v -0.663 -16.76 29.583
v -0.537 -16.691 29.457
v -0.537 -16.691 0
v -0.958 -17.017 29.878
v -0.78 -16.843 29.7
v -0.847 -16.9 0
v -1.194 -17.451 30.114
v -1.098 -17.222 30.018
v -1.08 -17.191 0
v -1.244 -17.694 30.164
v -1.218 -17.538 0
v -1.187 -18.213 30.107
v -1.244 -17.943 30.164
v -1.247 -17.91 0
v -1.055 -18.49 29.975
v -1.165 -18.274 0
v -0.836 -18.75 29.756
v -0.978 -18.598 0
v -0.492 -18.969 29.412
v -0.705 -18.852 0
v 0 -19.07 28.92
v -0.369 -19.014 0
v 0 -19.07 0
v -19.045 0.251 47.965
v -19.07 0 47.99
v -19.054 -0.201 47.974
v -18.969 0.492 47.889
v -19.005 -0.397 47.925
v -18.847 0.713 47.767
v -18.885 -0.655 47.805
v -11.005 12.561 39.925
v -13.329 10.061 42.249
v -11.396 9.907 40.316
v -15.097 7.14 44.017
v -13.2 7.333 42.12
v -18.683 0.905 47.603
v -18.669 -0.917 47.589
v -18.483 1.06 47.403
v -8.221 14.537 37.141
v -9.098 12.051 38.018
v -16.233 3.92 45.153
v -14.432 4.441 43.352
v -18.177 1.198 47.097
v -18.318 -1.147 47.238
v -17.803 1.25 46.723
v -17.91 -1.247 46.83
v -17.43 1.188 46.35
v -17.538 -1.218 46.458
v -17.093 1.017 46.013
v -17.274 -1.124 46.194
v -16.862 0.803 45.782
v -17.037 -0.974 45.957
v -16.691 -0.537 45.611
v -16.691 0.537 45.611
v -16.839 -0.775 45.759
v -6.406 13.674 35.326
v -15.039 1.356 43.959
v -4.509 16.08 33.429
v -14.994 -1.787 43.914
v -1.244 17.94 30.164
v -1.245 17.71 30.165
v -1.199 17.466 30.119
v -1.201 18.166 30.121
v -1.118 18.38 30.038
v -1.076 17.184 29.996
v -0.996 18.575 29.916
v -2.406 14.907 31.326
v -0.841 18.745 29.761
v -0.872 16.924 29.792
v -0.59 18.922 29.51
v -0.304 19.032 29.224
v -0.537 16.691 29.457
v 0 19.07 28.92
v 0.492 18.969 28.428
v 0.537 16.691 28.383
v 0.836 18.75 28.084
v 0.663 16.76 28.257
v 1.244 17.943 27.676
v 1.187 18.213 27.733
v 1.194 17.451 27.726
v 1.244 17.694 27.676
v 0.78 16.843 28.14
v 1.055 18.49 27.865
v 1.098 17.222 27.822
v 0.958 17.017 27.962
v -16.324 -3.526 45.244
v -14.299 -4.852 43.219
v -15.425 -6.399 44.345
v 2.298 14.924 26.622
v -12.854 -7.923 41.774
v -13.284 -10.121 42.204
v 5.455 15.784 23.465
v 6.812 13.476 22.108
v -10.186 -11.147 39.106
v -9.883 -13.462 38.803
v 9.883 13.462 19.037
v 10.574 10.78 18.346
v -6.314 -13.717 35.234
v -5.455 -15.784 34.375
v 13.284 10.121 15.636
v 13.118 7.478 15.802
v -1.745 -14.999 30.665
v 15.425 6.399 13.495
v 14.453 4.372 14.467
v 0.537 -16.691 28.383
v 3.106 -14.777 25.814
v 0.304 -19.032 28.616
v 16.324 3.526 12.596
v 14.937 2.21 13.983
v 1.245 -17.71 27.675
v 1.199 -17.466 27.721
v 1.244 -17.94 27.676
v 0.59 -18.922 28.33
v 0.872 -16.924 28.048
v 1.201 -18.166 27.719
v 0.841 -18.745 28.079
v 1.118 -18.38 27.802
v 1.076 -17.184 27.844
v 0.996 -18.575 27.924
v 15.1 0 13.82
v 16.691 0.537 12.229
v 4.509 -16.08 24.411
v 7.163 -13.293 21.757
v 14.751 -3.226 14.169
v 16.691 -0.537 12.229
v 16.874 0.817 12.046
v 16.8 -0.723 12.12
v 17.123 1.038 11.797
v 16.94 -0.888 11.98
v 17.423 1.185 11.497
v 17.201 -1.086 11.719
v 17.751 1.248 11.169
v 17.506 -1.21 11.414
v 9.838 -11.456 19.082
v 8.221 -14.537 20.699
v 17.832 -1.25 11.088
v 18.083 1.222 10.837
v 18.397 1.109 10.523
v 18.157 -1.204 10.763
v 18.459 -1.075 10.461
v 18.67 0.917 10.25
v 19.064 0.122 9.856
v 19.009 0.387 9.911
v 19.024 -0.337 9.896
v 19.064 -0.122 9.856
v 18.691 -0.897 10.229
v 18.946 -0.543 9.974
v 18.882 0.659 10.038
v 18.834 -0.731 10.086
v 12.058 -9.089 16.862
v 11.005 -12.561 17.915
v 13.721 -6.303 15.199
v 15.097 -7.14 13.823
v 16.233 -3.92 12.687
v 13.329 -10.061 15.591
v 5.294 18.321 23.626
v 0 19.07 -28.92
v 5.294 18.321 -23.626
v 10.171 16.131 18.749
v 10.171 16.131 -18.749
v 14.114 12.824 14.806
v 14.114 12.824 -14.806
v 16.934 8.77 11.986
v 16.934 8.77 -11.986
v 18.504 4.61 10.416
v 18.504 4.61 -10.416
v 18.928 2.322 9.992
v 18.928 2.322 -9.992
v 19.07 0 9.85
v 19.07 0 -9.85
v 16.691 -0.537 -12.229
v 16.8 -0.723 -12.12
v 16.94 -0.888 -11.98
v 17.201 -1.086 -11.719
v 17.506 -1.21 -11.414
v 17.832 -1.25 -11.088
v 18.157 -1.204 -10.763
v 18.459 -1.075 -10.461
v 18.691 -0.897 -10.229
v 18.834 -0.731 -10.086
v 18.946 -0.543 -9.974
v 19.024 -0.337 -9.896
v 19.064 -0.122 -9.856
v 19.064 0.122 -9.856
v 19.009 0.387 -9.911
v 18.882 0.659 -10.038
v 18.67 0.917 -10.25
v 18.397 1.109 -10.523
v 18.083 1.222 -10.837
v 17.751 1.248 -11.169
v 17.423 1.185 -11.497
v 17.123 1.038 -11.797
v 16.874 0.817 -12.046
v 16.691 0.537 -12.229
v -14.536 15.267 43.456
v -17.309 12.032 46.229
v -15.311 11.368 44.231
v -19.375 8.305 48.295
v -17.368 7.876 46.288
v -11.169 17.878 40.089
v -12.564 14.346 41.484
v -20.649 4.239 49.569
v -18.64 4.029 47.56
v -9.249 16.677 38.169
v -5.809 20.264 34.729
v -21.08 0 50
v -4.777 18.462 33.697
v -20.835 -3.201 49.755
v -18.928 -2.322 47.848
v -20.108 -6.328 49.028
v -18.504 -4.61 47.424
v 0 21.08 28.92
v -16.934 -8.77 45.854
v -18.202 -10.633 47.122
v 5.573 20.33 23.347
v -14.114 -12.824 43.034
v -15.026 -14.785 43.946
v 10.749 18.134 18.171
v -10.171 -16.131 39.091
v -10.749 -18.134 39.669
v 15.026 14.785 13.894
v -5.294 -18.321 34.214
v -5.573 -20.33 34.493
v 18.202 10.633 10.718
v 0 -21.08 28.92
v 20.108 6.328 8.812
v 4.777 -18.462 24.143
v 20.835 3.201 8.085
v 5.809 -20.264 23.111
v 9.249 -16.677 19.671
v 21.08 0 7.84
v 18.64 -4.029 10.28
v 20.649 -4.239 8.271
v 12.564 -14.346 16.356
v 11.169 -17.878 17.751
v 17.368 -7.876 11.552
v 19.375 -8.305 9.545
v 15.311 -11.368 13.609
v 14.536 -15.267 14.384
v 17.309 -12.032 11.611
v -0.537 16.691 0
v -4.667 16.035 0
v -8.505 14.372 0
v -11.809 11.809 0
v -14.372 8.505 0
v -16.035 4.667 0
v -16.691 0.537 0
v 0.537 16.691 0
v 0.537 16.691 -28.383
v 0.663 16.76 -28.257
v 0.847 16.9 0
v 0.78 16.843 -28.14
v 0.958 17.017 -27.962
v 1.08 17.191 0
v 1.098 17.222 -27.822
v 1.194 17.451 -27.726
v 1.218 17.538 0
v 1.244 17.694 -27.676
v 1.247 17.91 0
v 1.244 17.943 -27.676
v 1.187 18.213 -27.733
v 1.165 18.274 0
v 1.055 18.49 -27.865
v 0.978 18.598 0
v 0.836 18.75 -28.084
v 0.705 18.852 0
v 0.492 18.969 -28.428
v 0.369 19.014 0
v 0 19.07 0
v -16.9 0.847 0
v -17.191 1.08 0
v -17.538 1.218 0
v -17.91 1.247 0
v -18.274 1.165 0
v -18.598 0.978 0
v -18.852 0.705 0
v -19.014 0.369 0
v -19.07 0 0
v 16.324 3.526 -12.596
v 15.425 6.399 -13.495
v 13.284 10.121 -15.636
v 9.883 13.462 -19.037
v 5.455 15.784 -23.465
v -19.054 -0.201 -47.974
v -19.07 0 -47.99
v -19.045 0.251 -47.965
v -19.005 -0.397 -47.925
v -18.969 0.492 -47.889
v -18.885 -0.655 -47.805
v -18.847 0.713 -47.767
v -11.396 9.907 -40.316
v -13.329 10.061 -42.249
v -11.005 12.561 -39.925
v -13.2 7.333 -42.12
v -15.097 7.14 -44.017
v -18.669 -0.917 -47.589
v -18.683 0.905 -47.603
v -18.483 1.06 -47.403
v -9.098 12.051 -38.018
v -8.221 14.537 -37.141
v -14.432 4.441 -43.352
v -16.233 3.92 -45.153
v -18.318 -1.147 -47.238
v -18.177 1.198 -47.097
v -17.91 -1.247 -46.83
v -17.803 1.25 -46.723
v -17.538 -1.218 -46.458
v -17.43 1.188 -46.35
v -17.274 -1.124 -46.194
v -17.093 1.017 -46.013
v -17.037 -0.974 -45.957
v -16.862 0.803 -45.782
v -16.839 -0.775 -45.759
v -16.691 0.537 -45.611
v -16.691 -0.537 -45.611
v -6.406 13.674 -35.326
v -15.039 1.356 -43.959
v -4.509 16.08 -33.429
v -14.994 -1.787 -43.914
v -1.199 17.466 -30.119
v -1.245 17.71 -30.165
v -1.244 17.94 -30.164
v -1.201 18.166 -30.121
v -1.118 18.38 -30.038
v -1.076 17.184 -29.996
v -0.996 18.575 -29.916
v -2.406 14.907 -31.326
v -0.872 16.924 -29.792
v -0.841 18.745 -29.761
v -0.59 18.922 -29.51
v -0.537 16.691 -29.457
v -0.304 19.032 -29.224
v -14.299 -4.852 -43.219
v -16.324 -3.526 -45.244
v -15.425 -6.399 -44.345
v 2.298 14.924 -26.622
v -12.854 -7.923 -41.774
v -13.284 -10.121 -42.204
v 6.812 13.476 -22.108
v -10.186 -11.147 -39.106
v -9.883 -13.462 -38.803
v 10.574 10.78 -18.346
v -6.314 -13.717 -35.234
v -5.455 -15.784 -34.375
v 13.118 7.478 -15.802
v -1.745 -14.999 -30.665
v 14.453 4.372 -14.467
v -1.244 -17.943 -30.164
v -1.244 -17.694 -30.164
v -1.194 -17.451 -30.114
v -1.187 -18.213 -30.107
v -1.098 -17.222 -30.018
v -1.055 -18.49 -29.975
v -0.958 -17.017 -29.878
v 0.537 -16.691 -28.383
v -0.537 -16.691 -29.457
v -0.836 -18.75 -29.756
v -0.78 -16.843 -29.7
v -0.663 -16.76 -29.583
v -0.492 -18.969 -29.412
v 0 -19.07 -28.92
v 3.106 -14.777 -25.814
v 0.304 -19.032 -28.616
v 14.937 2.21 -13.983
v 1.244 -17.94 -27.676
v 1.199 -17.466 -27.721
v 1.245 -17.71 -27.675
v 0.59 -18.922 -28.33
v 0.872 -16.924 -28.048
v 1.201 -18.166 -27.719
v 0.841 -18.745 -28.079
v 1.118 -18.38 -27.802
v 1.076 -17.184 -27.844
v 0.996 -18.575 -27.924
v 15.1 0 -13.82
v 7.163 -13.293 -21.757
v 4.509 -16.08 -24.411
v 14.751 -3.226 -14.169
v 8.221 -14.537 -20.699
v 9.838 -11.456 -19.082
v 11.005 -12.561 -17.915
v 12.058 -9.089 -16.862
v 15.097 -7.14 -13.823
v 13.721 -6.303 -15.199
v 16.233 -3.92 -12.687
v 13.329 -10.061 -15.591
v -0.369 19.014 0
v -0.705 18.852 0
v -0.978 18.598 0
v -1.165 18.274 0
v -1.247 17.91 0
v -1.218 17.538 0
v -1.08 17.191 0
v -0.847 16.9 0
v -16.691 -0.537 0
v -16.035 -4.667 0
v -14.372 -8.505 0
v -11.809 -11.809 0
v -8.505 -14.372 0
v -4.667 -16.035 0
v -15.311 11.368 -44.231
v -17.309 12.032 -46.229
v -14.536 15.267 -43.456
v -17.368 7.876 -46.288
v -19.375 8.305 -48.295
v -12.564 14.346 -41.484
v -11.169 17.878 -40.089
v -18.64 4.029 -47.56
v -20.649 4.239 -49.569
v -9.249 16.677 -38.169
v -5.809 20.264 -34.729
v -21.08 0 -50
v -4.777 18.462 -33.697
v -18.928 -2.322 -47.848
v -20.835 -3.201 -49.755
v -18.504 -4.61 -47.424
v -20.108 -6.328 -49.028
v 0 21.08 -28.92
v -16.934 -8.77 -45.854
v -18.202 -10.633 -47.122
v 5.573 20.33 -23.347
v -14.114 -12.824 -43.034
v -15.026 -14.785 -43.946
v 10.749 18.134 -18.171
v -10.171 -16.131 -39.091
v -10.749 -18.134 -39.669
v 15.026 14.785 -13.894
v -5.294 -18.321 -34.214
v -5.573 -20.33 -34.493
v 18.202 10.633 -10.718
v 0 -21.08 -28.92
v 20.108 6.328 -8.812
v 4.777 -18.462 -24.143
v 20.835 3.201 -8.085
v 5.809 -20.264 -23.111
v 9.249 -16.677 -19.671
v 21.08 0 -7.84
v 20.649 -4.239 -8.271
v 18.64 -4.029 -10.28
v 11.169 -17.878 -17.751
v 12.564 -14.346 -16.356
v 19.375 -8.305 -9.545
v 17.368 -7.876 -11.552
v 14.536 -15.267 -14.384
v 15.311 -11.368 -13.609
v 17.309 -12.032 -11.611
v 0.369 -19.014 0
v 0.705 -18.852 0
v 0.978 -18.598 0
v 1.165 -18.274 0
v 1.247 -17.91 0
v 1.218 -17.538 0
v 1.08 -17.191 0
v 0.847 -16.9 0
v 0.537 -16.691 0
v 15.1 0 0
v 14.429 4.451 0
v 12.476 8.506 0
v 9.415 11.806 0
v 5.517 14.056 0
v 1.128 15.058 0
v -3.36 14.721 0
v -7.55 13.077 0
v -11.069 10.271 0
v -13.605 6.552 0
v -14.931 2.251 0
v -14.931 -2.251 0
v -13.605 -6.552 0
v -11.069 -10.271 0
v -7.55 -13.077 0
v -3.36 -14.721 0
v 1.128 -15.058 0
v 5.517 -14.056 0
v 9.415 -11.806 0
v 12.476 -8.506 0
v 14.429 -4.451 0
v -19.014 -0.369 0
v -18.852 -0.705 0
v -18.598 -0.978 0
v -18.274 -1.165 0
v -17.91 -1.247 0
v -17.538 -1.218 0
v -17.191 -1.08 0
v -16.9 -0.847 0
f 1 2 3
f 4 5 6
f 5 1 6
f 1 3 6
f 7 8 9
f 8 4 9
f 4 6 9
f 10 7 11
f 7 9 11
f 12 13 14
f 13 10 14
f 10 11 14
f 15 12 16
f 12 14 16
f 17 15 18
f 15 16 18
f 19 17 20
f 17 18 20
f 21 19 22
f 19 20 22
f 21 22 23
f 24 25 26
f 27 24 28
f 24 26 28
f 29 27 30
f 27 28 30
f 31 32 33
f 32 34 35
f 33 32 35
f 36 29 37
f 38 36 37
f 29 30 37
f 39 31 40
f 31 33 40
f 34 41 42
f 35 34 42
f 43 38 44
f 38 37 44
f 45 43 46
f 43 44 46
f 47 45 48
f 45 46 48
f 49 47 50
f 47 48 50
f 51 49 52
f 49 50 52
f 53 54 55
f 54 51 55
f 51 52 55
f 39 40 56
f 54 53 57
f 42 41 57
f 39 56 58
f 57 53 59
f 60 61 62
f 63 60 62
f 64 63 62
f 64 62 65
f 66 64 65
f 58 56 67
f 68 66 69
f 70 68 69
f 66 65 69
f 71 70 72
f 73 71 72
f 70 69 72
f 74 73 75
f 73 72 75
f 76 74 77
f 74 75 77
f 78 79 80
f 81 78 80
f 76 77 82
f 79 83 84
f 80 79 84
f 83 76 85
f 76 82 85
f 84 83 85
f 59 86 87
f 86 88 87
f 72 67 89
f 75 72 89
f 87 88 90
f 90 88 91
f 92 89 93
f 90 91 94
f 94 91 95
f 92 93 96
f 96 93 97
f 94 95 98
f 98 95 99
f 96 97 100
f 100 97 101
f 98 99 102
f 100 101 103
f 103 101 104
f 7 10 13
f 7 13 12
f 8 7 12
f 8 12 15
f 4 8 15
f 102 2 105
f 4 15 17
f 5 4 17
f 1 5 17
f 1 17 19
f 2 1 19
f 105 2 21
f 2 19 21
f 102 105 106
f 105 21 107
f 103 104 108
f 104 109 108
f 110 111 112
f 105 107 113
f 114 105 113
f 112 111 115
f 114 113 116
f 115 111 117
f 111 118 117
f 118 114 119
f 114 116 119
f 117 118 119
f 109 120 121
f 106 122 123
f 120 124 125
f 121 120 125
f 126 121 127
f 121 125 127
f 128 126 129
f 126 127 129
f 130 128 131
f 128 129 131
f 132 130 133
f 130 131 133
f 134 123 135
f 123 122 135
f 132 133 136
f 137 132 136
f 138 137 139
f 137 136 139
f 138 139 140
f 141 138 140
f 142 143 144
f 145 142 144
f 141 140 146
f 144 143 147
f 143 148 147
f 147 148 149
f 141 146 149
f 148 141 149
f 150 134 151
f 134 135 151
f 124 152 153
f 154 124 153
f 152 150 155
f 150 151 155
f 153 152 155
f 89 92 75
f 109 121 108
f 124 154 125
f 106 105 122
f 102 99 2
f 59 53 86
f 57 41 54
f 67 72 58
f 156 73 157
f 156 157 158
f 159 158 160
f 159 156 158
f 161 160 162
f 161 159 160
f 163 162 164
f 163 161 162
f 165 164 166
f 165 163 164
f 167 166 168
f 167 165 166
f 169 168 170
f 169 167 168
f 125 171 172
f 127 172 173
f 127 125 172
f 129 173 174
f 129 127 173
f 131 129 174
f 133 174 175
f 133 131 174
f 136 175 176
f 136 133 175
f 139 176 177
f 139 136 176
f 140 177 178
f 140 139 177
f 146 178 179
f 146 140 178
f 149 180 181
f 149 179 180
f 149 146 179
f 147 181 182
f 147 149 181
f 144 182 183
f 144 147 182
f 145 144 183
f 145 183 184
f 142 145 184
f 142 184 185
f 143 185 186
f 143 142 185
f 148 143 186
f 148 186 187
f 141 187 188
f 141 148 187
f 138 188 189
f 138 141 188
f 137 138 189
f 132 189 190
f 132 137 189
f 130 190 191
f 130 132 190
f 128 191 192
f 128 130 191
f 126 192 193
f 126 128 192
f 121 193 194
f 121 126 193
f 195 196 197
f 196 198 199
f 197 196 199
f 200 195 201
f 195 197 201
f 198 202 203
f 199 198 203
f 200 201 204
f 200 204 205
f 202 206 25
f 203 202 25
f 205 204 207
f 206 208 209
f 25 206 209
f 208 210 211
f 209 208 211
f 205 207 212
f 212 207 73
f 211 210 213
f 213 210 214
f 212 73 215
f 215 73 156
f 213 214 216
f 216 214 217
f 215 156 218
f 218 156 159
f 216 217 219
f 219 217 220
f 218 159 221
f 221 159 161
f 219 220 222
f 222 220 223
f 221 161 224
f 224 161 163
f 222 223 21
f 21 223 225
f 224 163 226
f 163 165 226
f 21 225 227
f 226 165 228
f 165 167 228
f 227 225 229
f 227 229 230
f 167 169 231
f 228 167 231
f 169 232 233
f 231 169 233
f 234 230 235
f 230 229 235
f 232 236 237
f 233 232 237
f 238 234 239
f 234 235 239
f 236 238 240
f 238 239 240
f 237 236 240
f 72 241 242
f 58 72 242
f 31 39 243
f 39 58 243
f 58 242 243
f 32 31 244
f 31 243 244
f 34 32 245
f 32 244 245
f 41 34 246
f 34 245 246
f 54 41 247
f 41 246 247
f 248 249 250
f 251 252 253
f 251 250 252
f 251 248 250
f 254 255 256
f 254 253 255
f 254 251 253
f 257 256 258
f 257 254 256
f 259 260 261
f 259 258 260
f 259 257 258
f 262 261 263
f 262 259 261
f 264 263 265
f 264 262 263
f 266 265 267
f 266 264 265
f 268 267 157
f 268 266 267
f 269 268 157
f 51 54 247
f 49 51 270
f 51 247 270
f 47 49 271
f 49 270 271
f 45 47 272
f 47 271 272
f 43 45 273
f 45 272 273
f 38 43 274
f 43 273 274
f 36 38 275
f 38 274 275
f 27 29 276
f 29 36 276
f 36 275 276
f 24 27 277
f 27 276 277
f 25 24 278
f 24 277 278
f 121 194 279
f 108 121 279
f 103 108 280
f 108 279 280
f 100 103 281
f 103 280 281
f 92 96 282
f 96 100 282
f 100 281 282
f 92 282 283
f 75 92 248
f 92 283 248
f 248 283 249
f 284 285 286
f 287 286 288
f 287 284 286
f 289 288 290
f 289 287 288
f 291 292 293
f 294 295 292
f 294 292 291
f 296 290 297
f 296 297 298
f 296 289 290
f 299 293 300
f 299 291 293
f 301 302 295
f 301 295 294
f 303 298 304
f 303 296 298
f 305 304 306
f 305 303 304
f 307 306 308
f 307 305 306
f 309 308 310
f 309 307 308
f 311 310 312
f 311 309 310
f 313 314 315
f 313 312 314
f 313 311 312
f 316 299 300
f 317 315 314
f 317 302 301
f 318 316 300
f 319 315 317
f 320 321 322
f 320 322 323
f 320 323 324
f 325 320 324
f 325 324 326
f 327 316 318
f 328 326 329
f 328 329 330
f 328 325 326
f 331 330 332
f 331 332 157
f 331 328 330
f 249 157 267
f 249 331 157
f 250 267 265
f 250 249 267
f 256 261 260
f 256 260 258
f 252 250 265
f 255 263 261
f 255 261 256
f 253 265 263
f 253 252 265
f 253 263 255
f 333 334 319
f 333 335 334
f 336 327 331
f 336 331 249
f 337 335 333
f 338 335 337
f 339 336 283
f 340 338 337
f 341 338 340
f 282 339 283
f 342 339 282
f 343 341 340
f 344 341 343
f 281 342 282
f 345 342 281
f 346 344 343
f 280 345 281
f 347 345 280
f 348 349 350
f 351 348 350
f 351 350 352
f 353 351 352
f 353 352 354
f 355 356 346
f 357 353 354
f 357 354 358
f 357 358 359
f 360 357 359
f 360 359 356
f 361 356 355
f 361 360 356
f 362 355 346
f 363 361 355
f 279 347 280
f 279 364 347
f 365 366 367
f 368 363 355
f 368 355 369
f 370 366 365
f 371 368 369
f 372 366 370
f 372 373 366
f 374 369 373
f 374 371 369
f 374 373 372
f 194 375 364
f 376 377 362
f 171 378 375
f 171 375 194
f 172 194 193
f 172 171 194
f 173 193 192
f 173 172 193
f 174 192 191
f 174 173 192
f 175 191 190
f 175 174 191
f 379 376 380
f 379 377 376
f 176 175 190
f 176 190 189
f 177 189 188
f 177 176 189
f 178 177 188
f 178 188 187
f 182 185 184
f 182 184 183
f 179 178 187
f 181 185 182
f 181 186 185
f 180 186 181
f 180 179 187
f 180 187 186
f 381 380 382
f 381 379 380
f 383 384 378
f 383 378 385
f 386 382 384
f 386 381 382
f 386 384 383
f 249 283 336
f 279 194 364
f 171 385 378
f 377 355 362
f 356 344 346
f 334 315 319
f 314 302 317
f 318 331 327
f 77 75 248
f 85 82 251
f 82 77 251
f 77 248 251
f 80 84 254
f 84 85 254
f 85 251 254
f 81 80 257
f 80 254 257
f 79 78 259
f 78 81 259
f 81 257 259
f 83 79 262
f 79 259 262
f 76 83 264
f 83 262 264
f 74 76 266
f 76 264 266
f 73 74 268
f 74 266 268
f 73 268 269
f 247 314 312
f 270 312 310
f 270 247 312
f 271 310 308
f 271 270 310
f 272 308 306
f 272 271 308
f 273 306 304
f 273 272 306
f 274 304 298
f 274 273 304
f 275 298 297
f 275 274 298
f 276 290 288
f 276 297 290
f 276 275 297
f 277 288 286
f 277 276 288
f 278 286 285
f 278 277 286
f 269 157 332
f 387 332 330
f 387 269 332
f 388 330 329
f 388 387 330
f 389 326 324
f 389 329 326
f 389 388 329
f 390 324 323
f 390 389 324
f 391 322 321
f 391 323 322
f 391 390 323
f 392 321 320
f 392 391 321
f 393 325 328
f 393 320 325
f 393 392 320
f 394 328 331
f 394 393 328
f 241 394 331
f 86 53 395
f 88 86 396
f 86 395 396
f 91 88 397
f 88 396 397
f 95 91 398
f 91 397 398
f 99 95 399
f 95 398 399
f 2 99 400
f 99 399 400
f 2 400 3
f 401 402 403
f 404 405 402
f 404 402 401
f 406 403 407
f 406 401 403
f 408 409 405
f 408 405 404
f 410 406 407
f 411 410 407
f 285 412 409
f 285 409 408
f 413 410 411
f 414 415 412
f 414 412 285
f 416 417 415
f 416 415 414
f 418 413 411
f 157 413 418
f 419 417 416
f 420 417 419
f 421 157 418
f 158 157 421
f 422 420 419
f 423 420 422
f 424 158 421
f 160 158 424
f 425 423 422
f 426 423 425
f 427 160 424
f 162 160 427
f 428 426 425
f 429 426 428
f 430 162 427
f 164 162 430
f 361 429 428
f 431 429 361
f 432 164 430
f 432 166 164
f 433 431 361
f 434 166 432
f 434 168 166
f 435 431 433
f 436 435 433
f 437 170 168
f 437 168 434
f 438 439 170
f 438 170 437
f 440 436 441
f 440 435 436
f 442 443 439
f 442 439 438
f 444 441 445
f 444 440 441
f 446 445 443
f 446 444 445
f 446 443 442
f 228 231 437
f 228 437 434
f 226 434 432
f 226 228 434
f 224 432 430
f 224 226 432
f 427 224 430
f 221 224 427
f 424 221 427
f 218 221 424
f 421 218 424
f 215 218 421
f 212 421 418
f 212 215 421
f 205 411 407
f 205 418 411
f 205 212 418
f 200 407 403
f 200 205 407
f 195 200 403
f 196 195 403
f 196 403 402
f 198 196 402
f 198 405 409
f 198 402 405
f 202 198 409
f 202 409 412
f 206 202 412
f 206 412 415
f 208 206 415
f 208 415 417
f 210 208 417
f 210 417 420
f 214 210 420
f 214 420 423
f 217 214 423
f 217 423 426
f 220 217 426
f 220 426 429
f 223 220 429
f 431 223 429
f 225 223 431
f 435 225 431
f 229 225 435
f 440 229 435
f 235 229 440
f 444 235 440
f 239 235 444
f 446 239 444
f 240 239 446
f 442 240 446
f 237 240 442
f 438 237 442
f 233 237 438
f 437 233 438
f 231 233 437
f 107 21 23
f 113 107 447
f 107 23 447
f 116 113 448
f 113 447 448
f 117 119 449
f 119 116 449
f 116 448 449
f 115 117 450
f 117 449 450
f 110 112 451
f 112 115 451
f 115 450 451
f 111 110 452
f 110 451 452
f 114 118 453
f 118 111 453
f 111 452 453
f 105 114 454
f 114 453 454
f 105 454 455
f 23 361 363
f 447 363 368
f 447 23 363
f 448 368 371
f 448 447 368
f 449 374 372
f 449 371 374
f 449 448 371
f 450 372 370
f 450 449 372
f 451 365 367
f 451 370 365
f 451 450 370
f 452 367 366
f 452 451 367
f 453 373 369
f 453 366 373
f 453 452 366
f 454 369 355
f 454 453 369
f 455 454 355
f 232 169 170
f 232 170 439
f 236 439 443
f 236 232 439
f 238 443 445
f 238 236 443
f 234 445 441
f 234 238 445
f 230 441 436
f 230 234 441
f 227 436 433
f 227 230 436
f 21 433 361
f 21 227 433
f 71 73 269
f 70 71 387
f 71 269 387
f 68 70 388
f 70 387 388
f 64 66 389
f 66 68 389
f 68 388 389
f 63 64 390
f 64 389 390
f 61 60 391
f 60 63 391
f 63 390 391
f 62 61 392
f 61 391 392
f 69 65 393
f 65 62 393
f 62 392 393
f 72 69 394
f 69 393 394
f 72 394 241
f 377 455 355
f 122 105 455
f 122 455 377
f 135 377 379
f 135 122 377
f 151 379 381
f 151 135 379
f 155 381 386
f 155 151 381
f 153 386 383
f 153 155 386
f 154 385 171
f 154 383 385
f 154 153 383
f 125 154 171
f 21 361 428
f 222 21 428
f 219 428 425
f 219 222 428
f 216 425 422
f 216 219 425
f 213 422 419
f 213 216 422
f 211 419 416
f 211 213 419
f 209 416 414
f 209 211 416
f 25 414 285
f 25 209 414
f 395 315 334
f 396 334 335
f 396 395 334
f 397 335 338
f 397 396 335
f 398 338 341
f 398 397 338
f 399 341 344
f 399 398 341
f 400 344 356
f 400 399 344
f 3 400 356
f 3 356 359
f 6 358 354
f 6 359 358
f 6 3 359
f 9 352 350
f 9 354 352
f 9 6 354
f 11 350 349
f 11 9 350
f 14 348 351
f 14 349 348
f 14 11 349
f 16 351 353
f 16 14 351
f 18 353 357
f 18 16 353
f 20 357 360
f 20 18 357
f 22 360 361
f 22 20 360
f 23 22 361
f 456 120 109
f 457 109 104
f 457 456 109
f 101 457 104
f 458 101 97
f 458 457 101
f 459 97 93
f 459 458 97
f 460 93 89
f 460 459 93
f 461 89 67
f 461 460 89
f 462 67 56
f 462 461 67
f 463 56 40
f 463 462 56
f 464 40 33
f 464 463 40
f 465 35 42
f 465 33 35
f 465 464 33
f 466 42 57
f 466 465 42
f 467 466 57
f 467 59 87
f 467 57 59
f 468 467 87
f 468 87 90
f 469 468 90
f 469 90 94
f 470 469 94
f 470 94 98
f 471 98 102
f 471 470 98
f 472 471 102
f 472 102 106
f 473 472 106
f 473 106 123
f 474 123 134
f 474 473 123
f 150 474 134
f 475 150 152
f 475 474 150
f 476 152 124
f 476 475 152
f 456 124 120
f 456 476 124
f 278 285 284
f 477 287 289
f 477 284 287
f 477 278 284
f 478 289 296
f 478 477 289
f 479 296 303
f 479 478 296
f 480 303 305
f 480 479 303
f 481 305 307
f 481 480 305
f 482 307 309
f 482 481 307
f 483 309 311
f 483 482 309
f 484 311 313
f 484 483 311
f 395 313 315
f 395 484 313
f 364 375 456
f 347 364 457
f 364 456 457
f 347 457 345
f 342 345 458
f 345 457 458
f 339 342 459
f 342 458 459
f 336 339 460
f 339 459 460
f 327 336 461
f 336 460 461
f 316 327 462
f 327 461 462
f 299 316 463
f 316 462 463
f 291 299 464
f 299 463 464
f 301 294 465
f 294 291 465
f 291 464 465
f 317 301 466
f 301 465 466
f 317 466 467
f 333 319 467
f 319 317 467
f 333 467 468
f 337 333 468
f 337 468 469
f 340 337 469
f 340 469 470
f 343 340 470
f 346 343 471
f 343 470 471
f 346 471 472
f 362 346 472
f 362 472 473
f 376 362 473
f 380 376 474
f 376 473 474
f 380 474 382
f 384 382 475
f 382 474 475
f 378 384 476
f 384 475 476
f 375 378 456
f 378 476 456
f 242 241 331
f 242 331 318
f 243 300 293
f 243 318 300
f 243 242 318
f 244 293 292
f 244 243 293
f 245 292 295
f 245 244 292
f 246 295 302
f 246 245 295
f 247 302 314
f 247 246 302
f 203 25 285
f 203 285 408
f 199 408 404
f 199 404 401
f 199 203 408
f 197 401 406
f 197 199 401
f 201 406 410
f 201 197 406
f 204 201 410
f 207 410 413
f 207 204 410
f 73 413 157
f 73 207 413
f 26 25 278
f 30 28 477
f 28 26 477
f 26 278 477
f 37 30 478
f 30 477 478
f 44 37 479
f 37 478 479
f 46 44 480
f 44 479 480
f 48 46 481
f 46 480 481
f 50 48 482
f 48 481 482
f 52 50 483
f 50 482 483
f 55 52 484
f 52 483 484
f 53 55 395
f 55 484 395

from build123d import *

# Parameters (mm, degrees)
SKETCH1_R             = 21.08
BOSS_EXTRUDE2_DEPTH   = 50
SKETCH1_R_2           = 15.1
BOSS_EXTRUDE2_2_DEPTH = 50
CUT_EXTRUDE1_START    = -21.08
CUT_EXTRUDE1_DEPTH    = 42.16


with BuildPart() as part:
    # Sketch1 → Boss-Extrude2 (new body, symmetric)
    with BuildSketch(Plane.XY):
        Circle(SKETCH1_R)
        with BuildLine():
            ThreePointArc((19.07, 0), (13.484526, -13.484526), (0, -19.07))
            ThreePointArc((0, -19.07), (-13.484526, -13.484526), (-19.07, 0))
            ThreePointArc((-19.07, 0), (-13.484526, 13.484526), (0, 19.07))
            ThreePointArc((0, 19.07), (13.484526, 13.484526), (19.07, 0))
        make_face(mode=Mode.SUBTRACT)
    extrude(amount=BOSS_EXTRUDE2_DEPTH, both=True)


with BuildPart() as body_2:
    # Sketch1 → Boss-Extrude2 2 (new body, symmetric)
    with BuildSketch(Plane.XY):
        with BuildLine():
            ThreePointArc((16.691355, -0.537272), (18.095403, -1.219284), (19.07, 0))
            ThreePointArc((19.07, 0), (18.095403, 1.219284), (16.691355, 0.537272))
            ThreePointArc((16.691355, 0.537272), (11.808683, 11.808683), (0.537272, 16.691355))
            ThreePointArc((0.537272, 16.691355), (1.219284, 18.095403), (0, 19.07))
            ThreePointArc((0, 19.07), (-1.219284, 18.095403), (-0.537272, 16.691355))
            ThreePointArc((-0.537272, 16.691355), (-11.808683, 11.808683), (-16.691355, 0.537272))
            ThreePointArc((-16.691355, 0.537272), (-18.095403, 1.219284), (-19.07, 0))
            ThreePointArc((-19.07, 0), (-18.095403, -1.219284), (-16.691355, -0.537272))
            ThreePointArc((-16.691355, -0.537272), (-11.808683, -11.808683), (-0.537272, -16.691355))
            ThreePointArc((-0.537272, -16.691355), (-1.219284, -18.095403), (0, -19.07))
            ThreePointArc((0, -19.07), (1.219284, -18.095403), (0.537272, -16.691355))
            ThreePointArc((0.537272, -16.691355), (11.808683, -11.808683), (16.691355, -0.537272))
        make_face()
        Circle(SKETCH1_R_2, mode=Mode.SUBTRACT)
    extrude(amount=BOSS_EXTRUDE2_2_DEPTH, both=True)


with BuildPart() as cut_extrude1_tool:
    # Sketch2 → Cut-Extrude1 (new body)
    with BuildSketch(Plane(origin=(0, 0, 0), x_dir=(1, 0, 0), z_dir=(0, 1, 0)).offset(CUT_EXTRUDE1_START)):
        Polygon((21.08, 50), (-21.08, 50), (21.08, 7.84), align=None)
        Polygon((21.08, -50), (-21.08, -50), (21.08, -7.84), align=None)
    extrude(amount=CUT_EXTRUDE1_DEPTH)


with BuildPart() as part_1:
    add(part.part)

    # Cut-Extrude1: cut by cut_extrude1_tool
    add(cut_extrude1_tool.part, mode=Mode.SUBTRACT)


with BuildPart() as body_2_1:
    add(body_2.part)

    # Cut-Extrude1: cut by cut_extrude1_tool
    add(cut_extrude1_tool.part, mode=Mode.SUBTRACT)


solid = Compound([part_1.part, body_2_1.part])
